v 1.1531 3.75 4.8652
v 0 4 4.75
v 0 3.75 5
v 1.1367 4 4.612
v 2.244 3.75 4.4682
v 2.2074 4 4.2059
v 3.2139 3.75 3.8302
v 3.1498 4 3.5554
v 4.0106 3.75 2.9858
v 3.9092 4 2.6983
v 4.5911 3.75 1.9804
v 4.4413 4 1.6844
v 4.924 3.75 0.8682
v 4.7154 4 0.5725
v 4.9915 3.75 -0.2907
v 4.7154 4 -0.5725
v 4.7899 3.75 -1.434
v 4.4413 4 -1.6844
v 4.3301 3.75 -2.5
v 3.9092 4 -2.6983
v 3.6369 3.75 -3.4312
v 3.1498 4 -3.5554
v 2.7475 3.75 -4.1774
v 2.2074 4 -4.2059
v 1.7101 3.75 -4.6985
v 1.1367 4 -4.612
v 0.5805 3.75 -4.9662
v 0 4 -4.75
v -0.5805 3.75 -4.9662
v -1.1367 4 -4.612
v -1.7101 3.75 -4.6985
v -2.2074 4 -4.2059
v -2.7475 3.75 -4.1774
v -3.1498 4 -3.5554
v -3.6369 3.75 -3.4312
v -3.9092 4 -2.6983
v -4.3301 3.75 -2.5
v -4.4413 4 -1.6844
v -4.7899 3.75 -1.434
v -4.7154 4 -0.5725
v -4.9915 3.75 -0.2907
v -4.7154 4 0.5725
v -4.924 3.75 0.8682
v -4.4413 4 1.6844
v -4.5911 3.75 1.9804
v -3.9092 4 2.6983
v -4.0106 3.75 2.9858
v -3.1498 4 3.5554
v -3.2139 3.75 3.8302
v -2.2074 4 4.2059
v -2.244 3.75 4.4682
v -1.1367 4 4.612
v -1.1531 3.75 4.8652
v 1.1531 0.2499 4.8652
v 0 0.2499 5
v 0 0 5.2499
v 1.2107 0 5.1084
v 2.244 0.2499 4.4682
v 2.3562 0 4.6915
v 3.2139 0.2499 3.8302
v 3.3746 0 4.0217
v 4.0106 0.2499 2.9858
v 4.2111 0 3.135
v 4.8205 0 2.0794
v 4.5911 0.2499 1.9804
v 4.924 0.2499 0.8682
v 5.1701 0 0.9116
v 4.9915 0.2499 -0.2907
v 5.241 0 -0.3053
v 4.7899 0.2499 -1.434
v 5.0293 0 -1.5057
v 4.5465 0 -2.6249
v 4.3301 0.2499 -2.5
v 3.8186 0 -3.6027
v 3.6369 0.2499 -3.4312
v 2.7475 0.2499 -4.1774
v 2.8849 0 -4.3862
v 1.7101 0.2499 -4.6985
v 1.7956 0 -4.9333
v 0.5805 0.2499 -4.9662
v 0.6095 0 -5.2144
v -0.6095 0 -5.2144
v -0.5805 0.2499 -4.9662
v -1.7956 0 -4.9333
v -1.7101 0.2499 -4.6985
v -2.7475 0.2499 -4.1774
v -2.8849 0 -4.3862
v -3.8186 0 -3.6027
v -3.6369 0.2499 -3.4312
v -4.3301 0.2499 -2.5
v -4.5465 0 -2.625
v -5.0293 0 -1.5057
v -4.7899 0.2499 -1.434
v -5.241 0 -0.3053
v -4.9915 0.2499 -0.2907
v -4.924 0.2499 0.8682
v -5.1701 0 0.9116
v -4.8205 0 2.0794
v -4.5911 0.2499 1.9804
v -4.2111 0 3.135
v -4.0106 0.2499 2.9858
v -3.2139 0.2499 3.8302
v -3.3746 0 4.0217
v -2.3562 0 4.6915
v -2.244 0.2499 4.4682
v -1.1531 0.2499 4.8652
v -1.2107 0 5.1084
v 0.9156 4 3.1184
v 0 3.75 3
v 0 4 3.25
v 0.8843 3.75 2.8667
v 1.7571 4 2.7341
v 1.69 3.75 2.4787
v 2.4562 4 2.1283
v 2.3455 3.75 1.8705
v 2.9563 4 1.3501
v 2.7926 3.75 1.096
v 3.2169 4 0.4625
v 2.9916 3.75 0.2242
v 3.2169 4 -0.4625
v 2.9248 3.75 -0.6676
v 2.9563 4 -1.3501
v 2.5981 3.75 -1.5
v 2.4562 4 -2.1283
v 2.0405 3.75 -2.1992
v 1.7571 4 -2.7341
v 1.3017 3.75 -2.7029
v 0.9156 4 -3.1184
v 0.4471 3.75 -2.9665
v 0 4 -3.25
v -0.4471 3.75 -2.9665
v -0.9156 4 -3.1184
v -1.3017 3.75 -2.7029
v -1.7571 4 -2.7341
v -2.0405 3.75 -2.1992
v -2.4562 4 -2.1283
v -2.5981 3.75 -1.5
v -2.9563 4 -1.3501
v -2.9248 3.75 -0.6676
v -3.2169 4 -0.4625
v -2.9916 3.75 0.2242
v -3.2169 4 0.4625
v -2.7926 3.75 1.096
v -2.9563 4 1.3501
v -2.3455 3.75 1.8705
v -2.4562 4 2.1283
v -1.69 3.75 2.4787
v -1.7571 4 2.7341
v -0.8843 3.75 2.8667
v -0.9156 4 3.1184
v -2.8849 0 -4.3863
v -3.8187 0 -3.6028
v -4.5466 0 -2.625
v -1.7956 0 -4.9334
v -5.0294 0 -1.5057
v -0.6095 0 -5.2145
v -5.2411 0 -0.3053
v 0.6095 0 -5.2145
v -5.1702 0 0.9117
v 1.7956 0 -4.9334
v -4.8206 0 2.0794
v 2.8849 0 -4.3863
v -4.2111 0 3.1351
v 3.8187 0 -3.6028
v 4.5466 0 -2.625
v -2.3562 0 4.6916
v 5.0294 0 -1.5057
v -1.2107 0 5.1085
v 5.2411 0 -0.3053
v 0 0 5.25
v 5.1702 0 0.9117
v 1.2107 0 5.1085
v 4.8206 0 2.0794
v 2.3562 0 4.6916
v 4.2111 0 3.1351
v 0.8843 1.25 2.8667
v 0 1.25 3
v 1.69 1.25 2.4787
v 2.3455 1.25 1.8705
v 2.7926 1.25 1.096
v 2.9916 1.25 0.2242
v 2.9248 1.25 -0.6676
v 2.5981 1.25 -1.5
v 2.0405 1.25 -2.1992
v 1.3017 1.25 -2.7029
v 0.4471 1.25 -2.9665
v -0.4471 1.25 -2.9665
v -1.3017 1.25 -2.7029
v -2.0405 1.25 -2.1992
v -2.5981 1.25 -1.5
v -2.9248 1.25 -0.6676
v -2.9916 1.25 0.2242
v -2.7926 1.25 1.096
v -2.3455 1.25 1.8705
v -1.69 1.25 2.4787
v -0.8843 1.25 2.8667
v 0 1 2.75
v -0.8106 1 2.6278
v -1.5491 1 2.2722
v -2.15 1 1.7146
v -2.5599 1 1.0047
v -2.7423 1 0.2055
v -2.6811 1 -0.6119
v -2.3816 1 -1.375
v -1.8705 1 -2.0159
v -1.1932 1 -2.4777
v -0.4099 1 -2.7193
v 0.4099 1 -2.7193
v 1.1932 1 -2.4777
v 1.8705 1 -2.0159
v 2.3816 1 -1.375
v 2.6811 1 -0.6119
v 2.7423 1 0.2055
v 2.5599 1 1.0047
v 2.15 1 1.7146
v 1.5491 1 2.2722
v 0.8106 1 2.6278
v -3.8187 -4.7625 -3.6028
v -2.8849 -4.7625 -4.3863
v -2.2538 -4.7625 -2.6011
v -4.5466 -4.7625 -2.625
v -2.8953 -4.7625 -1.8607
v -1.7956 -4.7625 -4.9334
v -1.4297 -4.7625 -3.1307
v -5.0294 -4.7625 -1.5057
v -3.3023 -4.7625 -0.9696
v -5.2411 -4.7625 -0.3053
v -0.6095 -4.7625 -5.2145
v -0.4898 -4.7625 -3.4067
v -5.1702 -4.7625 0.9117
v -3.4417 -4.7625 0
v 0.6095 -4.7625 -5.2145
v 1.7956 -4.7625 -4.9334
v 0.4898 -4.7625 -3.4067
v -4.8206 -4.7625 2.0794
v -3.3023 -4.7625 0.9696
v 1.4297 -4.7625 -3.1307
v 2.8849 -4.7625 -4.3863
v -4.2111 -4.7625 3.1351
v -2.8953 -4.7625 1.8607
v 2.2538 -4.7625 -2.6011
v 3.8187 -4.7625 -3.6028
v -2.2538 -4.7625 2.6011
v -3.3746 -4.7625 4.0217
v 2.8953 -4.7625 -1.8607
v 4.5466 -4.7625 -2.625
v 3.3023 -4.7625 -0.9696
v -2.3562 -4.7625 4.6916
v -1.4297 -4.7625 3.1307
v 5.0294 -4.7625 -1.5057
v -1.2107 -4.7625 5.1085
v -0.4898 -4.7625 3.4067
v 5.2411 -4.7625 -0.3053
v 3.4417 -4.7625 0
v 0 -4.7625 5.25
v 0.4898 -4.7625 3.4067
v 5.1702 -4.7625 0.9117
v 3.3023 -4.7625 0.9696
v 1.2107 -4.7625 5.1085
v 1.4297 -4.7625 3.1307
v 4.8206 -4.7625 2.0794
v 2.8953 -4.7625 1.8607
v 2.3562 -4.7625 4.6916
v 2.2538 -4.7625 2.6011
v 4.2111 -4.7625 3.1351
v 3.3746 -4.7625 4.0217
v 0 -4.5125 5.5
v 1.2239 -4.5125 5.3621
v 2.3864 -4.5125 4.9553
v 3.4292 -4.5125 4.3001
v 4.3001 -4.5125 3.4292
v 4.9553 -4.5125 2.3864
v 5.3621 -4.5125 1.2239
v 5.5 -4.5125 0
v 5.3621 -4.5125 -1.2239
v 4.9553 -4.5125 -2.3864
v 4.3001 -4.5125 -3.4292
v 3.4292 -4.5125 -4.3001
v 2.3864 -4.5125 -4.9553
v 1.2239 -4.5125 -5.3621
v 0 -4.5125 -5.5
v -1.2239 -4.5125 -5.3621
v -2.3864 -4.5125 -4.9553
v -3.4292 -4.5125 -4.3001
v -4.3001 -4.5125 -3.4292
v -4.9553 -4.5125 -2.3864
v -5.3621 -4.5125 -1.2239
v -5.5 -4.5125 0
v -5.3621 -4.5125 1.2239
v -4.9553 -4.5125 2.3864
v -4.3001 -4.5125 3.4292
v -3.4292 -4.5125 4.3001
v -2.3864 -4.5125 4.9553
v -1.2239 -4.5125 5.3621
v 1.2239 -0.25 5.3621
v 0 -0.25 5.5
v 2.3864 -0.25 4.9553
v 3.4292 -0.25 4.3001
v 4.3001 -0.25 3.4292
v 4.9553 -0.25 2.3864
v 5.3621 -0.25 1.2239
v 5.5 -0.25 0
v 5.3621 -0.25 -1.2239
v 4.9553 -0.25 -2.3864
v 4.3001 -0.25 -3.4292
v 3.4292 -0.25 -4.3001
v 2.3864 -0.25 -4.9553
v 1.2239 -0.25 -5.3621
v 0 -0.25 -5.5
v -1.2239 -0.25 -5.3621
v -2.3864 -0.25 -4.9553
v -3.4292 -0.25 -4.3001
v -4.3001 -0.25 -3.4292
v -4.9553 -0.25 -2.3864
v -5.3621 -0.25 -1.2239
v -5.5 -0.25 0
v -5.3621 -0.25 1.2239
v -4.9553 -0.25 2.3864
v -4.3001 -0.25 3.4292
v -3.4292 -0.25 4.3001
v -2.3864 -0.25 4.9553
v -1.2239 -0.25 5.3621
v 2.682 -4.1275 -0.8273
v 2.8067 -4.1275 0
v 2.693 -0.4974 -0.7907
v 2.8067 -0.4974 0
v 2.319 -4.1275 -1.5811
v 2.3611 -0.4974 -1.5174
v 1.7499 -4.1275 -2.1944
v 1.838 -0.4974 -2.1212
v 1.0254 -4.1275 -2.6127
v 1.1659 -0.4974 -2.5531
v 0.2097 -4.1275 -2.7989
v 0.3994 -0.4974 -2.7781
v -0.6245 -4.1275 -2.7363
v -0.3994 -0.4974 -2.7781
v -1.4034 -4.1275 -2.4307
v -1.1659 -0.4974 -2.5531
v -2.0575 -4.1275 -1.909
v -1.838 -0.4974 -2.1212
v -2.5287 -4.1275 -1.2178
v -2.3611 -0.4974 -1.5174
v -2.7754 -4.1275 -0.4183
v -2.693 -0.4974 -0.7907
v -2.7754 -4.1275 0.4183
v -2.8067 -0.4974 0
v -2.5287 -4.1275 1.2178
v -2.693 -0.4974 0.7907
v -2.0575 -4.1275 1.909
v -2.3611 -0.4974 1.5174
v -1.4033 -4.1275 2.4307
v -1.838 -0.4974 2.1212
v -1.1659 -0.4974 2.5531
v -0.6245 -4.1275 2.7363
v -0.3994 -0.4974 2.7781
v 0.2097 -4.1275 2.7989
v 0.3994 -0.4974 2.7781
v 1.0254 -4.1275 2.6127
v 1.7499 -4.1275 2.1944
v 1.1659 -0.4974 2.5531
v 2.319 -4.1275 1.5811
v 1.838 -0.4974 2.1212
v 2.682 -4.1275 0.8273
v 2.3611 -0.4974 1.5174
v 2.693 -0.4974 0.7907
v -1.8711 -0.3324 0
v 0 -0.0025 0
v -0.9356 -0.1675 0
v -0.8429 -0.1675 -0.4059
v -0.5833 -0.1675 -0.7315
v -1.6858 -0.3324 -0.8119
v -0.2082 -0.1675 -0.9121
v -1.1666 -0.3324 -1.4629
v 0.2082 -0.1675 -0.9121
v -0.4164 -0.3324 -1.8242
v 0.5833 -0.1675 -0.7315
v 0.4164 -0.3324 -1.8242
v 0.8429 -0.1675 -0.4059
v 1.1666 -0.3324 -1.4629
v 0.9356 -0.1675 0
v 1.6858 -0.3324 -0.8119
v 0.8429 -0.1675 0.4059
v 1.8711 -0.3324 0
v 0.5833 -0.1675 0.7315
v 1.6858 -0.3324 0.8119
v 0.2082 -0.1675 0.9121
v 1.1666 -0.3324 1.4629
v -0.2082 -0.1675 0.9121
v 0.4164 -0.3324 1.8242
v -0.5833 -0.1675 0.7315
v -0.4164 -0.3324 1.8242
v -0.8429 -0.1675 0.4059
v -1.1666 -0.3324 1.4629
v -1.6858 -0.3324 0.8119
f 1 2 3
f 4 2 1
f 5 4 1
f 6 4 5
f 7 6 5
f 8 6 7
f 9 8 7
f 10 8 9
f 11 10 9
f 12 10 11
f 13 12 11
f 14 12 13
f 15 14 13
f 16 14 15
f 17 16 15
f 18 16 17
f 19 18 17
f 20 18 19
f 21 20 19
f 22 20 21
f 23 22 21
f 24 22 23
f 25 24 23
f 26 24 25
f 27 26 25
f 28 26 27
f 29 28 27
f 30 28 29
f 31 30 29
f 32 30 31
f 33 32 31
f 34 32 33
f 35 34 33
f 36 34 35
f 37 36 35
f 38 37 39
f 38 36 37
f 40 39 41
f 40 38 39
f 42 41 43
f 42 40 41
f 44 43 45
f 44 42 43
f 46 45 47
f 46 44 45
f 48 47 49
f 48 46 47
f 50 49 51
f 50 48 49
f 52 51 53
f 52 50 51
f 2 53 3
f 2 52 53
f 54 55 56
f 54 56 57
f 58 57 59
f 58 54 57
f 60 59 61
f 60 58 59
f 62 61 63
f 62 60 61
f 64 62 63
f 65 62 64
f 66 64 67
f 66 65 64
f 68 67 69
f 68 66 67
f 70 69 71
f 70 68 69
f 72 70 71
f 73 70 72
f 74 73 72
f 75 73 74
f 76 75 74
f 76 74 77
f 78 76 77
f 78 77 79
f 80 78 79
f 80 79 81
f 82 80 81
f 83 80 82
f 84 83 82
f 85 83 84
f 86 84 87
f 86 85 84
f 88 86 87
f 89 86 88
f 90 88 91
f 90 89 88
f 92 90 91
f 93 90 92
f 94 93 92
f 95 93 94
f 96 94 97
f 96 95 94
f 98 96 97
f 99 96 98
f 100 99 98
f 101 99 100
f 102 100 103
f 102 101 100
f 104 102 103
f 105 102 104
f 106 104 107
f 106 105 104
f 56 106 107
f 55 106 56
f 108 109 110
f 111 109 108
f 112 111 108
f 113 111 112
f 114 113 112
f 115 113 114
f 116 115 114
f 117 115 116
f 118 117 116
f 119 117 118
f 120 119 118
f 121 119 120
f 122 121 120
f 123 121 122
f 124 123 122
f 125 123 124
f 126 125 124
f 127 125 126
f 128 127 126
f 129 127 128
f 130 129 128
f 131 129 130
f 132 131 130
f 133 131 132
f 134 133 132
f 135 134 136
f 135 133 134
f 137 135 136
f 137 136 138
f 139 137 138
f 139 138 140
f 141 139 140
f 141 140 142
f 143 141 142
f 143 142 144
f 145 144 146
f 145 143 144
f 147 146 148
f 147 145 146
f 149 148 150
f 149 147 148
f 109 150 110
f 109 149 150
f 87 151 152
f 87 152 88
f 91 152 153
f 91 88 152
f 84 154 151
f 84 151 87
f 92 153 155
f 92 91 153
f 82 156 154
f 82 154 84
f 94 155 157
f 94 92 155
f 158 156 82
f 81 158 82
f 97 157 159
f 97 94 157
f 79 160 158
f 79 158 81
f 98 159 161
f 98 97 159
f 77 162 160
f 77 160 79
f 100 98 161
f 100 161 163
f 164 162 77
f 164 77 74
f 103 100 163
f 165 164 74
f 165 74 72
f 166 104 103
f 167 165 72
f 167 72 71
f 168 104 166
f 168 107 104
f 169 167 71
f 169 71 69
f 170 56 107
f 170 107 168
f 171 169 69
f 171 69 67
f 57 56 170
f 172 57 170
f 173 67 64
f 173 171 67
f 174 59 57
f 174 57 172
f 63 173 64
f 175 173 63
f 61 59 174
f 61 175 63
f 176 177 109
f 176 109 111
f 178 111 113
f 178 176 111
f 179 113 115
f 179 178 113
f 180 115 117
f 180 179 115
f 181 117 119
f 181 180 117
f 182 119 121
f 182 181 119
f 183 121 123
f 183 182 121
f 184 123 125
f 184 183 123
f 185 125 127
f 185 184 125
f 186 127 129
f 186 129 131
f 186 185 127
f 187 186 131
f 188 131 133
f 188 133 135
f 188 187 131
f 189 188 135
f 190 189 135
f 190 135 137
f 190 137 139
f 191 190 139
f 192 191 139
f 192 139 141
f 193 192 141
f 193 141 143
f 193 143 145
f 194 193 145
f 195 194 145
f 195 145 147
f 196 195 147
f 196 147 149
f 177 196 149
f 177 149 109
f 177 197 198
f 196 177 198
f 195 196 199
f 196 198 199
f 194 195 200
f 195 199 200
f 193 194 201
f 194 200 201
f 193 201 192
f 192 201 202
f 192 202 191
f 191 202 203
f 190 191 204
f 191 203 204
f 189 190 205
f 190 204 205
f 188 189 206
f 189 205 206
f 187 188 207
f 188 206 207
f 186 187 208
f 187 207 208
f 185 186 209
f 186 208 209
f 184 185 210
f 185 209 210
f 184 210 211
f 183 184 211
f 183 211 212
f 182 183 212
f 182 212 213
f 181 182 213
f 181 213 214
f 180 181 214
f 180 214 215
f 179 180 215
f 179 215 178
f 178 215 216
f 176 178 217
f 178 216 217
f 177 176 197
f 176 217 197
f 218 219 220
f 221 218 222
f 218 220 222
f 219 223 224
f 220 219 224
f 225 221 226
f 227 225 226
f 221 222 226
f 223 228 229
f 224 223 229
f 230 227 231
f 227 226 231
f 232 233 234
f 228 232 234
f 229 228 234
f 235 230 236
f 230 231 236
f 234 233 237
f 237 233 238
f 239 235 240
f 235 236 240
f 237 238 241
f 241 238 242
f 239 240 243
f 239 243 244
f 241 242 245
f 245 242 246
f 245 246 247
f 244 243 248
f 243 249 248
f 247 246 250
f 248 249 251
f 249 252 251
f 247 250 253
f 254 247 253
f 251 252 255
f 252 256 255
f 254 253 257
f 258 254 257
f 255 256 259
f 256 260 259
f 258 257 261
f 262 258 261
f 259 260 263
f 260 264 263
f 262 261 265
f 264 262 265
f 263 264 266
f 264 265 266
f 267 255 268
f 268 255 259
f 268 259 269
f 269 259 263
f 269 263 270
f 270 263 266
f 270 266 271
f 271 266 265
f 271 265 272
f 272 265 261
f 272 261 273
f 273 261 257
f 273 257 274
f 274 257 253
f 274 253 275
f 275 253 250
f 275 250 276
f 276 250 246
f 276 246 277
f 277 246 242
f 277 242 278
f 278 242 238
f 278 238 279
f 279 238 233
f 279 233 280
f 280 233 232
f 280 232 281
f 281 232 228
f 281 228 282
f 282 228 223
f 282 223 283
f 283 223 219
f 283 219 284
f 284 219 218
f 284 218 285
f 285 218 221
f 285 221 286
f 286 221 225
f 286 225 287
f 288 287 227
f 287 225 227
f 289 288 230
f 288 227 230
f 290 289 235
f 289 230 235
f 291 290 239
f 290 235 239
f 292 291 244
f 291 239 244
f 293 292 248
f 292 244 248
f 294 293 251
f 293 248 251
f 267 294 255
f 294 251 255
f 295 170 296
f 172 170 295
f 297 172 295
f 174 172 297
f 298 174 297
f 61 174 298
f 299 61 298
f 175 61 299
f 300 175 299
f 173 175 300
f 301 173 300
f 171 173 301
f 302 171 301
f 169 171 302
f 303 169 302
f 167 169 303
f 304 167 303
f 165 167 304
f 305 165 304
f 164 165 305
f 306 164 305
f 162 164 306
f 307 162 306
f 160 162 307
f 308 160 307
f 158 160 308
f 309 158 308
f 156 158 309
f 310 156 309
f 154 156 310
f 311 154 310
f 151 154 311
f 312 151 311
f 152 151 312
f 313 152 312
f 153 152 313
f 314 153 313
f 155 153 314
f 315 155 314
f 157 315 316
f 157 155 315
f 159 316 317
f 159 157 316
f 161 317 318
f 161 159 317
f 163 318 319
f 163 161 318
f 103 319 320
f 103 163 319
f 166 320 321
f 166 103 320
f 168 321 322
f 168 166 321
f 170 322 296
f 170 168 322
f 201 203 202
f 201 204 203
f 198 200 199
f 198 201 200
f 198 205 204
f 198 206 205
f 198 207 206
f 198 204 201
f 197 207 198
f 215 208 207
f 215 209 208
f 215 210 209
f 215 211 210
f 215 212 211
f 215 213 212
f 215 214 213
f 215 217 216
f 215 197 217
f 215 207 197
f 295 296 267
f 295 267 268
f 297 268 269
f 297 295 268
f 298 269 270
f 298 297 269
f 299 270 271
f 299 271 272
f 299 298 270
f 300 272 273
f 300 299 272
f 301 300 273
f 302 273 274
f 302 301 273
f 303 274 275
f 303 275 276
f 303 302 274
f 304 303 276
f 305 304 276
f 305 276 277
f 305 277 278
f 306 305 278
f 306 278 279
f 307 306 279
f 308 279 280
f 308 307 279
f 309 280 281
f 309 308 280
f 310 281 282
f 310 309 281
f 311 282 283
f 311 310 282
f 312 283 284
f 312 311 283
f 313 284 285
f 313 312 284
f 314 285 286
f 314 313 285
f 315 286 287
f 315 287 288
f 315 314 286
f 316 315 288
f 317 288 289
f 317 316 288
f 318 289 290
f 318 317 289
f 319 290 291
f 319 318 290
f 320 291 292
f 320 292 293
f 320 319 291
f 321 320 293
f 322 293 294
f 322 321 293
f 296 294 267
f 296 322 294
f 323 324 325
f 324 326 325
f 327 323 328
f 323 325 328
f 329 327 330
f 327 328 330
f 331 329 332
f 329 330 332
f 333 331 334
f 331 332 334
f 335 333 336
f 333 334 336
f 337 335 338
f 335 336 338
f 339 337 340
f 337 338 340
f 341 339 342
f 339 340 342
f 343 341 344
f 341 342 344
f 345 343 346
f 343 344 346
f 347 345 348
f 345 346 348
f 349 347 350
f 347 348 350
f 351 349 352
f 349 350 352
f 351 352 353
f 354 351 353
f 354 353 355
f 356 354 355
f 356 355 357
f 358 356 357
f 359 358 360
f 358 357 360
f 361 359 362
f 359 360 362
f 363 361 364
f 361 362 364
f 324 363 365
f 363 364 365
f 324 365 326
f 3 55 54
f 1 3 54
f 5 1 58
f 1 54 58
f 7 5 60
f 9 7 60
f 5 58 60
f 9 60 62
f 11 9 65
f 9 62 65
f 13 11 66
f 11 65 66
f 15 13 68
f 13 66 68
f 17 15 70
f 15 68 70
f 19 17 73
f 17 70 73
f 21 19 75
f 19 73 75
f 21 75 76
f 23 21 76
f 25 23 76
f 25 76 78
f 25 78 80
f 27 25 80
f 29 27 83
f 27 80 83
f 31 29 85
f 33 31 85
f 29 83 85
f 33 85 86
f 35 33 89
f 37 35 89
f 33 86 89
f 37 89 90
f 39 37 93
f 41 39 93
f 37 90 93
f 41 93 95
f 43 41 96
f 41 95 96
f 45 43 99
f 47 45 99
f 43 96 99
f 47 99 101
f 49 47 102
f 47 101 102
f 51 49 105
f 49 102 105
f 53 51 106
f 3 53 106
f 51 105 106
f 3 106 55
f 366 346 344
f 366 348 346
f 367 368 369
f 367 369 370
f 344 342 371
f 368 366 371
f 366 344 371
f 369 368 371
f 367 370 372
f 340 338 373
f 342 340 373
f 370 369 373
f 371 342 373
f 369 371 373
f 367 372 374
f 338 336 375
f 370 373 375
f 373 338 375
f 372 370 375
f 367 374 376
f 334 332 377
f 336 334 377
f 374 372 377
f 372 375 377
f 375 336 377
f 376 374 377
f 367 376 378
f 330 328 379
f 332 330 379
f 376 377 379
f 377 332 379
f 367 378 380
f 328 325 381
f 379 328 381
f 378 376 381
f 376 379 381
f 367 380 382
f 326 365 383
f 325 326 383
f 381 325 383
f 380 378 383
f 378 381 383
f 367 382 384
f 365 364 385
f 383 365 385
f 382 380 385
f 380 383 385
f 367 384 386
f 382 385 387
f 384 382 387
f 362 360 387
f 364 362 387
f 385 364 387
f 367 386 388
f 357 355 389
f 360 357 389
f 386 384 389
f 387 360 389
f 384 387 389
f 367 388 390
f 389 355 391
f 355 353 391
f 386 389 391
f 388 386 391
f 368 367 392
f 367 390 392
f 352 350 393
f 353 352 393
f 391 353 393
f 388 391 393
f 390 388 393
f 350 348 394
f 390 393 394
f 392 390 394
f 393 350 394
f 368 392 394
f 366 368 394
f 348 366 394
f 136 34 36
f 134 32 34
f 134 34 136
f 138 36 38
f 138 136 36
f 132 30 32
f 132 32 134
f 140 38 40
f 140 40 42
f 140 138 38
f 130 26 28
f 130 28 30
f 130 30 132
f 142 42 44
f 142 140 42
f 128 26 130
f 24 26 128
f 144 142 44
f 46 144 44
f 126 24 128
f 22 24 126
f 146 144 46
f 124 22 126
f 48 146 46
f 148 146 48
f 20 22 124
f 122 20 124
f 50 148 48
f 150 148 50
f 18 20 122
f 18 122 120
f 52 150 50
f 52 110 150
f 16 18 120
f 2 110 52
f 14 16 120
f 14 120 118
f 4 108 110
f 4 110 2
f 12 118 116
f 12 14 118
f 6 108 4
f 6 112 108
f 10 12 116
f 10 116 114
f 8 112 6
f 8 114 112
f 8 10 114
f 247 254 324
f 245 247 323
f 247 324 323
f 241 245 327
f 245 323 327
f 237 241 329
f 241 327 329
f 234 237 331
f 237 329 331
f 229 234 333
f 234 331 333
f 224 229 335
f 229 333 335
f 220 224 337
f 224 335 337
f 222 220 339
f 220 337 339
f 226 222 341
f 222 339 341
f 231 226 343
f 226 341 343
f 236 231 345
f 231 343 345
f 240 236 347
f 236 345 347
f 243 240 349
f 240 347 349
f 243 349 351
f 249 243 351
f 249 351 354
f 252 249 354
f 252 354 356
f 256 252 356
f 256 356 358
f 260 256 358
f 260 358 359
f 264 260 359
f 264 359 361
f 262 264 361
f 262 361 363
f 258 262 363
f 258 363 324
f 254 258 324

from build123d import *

# Parameters (mm, degrees)
SKETCH1_R                            = 5
SKETCH1_R_2                          = 3
BOSS_EXTRUDE1_DEPTH                  = 1
SKETCH1_3_R                          = 5
SKETCH1_3_R_2                        = 3
BOSS_EXTRUDE2_DEPTH                  = 4
CHAMFER1_SIZE                        = 0.25
SKETCH5_R                            = 5.5
BOSS_EXTRUDE4_DEPTH                  = 4.7625
F_2_0_221_DIAMETER_HOLE1_D           = 5.6134
F_2_0_221_DIAMETER_HOLE1_DEPTH       = 4.265103063
F_2_0_221_DIAMETER_HOLE1_CSINK_D     = 6.8834
F_2_0_221_DIAMETER_HOLE1_CSINK_ANGLE = 90
F_2_0_221_DIAMETER_HOLE1_TIP         = 0.494896937
CHAMFER2_SIZE                        = 0.25
CHAMFER3_SIZE                        = 0.25


with BuildPart() as part:
    # Sketch1 → Boss-Extrude1 (new body)
    # profile 1 of 2: a face of its own
    with BuildSketch(Plane(origin=(0, 0, 0), x_dir=(1, 0, 0), z_dir=(0, 1, 0))):
        with Locations(Location((0, 0, 0), (0, 0, 270))):
            Circle(SKETCH1_R)
        Circle(SKETCH1_R_2, mode=Mode.SUBTRACT)
    # profile 2 of 2: a face of its own
    with BuildSketch(Plane(origin=(0, 0, 0), x_dir=(1, 0, 0), z_dir=(0, 1, 0))):
        Circle(SKETCH1_R_2)
    extrude(amount=BOSS_EXTRUDE1_DEPTH)

    # Sketch1<3> → Boss-Extrude2 (add)
    with BuildSketch(Plane(origin=(0, 0, 0), x_dir=(1, 0, 0), z_dir=(0, 1, 0))):
        with Locations(Location((0, 0, 0), (0, 0, 270))):
            Circle(SKETCH1_3_R)
        with Locations(Location((0, 0, 0), (0, 0, 270))):
            Circle(SKETCH1_3_R_2, mode=Mode.SUBTRACT)
    extrude(amount=BOSS_EXTRUDE2_DEPTH)

    # Chamfer1
    chamfer1_edges = [part.edges().sort_by_distance(p)[0] for p in [
        (0, 1, -3),
        (0, 4, -5),
        (0, 4, -3),
    ]]
    chamfer(chamfer1_edges, length=CHAMFER1_SIZE)

    # Sketch5 → Boss-Extrude4 (add)
    with BuildSketch(Plane(origin=(0, 0, 0), x_dir=(1, 0, 0), z_dir=(0, 1, 0))):
        with Locations(Location((0, 0, 0), (0, 0, 270))):
            Circle(SKETCH5_R)
    extrude(amount=-BOSS_EXTRUDE4_DEPTH)

    # #2 (0.221) Diameter Hole1
    with Locations(Plane(origin=(0, -4.7625, 0), x_dir=(-1, 0, 0), z_dir=(0, -1, 0))):
        with Locations((0, 0)):
            CounterSinkHole(F_2_0_221_DIAMETER_HOLE1_D / 2, F_2_0_221_DIAMETER_HOLE1_CSINK_D / 2, depth=F_2_0_221_DIAMETER_HOLE1_DEPTH, counter_sink_angle=F_2_0_221_DIAMETER_HOLE1_CSINK_ANGLE)
            with Locations((0, 0, -(F_2_0_221_DIAMETER_HOLE1_DEPTH + F_2_0_221_DIAMETER_HOLE1_TIP / 2))):  # 160° drill point
                Cone(0, F_2_0_221_DIAMETER_HOLE1_D / 2, F_2_0_221_DIAMETER_HOLE1_TIP, mode=Mode.SUBTRACT)

    # Chamfer2
    chamfer2_edges = [part.edges().sort_by_distance(p)[0] for p in [
        (0, -4.7625, -5.5),
        (0, 0, -5.5),
    ]]
    chamfer(chamfer2_edges, length=CHAMFER2_SIZE)

    # Chamfer3
    chamfer3_edges = [part.edges().sort_by_distance(p)[0] for p in [
        (0, 0, -5),
    ]]
    chamfer(chamfer3_edges, length=CHAMFER3_SIZE - 0.0001)  # a hair under: the kernel refuses the full size


solid = part.part
